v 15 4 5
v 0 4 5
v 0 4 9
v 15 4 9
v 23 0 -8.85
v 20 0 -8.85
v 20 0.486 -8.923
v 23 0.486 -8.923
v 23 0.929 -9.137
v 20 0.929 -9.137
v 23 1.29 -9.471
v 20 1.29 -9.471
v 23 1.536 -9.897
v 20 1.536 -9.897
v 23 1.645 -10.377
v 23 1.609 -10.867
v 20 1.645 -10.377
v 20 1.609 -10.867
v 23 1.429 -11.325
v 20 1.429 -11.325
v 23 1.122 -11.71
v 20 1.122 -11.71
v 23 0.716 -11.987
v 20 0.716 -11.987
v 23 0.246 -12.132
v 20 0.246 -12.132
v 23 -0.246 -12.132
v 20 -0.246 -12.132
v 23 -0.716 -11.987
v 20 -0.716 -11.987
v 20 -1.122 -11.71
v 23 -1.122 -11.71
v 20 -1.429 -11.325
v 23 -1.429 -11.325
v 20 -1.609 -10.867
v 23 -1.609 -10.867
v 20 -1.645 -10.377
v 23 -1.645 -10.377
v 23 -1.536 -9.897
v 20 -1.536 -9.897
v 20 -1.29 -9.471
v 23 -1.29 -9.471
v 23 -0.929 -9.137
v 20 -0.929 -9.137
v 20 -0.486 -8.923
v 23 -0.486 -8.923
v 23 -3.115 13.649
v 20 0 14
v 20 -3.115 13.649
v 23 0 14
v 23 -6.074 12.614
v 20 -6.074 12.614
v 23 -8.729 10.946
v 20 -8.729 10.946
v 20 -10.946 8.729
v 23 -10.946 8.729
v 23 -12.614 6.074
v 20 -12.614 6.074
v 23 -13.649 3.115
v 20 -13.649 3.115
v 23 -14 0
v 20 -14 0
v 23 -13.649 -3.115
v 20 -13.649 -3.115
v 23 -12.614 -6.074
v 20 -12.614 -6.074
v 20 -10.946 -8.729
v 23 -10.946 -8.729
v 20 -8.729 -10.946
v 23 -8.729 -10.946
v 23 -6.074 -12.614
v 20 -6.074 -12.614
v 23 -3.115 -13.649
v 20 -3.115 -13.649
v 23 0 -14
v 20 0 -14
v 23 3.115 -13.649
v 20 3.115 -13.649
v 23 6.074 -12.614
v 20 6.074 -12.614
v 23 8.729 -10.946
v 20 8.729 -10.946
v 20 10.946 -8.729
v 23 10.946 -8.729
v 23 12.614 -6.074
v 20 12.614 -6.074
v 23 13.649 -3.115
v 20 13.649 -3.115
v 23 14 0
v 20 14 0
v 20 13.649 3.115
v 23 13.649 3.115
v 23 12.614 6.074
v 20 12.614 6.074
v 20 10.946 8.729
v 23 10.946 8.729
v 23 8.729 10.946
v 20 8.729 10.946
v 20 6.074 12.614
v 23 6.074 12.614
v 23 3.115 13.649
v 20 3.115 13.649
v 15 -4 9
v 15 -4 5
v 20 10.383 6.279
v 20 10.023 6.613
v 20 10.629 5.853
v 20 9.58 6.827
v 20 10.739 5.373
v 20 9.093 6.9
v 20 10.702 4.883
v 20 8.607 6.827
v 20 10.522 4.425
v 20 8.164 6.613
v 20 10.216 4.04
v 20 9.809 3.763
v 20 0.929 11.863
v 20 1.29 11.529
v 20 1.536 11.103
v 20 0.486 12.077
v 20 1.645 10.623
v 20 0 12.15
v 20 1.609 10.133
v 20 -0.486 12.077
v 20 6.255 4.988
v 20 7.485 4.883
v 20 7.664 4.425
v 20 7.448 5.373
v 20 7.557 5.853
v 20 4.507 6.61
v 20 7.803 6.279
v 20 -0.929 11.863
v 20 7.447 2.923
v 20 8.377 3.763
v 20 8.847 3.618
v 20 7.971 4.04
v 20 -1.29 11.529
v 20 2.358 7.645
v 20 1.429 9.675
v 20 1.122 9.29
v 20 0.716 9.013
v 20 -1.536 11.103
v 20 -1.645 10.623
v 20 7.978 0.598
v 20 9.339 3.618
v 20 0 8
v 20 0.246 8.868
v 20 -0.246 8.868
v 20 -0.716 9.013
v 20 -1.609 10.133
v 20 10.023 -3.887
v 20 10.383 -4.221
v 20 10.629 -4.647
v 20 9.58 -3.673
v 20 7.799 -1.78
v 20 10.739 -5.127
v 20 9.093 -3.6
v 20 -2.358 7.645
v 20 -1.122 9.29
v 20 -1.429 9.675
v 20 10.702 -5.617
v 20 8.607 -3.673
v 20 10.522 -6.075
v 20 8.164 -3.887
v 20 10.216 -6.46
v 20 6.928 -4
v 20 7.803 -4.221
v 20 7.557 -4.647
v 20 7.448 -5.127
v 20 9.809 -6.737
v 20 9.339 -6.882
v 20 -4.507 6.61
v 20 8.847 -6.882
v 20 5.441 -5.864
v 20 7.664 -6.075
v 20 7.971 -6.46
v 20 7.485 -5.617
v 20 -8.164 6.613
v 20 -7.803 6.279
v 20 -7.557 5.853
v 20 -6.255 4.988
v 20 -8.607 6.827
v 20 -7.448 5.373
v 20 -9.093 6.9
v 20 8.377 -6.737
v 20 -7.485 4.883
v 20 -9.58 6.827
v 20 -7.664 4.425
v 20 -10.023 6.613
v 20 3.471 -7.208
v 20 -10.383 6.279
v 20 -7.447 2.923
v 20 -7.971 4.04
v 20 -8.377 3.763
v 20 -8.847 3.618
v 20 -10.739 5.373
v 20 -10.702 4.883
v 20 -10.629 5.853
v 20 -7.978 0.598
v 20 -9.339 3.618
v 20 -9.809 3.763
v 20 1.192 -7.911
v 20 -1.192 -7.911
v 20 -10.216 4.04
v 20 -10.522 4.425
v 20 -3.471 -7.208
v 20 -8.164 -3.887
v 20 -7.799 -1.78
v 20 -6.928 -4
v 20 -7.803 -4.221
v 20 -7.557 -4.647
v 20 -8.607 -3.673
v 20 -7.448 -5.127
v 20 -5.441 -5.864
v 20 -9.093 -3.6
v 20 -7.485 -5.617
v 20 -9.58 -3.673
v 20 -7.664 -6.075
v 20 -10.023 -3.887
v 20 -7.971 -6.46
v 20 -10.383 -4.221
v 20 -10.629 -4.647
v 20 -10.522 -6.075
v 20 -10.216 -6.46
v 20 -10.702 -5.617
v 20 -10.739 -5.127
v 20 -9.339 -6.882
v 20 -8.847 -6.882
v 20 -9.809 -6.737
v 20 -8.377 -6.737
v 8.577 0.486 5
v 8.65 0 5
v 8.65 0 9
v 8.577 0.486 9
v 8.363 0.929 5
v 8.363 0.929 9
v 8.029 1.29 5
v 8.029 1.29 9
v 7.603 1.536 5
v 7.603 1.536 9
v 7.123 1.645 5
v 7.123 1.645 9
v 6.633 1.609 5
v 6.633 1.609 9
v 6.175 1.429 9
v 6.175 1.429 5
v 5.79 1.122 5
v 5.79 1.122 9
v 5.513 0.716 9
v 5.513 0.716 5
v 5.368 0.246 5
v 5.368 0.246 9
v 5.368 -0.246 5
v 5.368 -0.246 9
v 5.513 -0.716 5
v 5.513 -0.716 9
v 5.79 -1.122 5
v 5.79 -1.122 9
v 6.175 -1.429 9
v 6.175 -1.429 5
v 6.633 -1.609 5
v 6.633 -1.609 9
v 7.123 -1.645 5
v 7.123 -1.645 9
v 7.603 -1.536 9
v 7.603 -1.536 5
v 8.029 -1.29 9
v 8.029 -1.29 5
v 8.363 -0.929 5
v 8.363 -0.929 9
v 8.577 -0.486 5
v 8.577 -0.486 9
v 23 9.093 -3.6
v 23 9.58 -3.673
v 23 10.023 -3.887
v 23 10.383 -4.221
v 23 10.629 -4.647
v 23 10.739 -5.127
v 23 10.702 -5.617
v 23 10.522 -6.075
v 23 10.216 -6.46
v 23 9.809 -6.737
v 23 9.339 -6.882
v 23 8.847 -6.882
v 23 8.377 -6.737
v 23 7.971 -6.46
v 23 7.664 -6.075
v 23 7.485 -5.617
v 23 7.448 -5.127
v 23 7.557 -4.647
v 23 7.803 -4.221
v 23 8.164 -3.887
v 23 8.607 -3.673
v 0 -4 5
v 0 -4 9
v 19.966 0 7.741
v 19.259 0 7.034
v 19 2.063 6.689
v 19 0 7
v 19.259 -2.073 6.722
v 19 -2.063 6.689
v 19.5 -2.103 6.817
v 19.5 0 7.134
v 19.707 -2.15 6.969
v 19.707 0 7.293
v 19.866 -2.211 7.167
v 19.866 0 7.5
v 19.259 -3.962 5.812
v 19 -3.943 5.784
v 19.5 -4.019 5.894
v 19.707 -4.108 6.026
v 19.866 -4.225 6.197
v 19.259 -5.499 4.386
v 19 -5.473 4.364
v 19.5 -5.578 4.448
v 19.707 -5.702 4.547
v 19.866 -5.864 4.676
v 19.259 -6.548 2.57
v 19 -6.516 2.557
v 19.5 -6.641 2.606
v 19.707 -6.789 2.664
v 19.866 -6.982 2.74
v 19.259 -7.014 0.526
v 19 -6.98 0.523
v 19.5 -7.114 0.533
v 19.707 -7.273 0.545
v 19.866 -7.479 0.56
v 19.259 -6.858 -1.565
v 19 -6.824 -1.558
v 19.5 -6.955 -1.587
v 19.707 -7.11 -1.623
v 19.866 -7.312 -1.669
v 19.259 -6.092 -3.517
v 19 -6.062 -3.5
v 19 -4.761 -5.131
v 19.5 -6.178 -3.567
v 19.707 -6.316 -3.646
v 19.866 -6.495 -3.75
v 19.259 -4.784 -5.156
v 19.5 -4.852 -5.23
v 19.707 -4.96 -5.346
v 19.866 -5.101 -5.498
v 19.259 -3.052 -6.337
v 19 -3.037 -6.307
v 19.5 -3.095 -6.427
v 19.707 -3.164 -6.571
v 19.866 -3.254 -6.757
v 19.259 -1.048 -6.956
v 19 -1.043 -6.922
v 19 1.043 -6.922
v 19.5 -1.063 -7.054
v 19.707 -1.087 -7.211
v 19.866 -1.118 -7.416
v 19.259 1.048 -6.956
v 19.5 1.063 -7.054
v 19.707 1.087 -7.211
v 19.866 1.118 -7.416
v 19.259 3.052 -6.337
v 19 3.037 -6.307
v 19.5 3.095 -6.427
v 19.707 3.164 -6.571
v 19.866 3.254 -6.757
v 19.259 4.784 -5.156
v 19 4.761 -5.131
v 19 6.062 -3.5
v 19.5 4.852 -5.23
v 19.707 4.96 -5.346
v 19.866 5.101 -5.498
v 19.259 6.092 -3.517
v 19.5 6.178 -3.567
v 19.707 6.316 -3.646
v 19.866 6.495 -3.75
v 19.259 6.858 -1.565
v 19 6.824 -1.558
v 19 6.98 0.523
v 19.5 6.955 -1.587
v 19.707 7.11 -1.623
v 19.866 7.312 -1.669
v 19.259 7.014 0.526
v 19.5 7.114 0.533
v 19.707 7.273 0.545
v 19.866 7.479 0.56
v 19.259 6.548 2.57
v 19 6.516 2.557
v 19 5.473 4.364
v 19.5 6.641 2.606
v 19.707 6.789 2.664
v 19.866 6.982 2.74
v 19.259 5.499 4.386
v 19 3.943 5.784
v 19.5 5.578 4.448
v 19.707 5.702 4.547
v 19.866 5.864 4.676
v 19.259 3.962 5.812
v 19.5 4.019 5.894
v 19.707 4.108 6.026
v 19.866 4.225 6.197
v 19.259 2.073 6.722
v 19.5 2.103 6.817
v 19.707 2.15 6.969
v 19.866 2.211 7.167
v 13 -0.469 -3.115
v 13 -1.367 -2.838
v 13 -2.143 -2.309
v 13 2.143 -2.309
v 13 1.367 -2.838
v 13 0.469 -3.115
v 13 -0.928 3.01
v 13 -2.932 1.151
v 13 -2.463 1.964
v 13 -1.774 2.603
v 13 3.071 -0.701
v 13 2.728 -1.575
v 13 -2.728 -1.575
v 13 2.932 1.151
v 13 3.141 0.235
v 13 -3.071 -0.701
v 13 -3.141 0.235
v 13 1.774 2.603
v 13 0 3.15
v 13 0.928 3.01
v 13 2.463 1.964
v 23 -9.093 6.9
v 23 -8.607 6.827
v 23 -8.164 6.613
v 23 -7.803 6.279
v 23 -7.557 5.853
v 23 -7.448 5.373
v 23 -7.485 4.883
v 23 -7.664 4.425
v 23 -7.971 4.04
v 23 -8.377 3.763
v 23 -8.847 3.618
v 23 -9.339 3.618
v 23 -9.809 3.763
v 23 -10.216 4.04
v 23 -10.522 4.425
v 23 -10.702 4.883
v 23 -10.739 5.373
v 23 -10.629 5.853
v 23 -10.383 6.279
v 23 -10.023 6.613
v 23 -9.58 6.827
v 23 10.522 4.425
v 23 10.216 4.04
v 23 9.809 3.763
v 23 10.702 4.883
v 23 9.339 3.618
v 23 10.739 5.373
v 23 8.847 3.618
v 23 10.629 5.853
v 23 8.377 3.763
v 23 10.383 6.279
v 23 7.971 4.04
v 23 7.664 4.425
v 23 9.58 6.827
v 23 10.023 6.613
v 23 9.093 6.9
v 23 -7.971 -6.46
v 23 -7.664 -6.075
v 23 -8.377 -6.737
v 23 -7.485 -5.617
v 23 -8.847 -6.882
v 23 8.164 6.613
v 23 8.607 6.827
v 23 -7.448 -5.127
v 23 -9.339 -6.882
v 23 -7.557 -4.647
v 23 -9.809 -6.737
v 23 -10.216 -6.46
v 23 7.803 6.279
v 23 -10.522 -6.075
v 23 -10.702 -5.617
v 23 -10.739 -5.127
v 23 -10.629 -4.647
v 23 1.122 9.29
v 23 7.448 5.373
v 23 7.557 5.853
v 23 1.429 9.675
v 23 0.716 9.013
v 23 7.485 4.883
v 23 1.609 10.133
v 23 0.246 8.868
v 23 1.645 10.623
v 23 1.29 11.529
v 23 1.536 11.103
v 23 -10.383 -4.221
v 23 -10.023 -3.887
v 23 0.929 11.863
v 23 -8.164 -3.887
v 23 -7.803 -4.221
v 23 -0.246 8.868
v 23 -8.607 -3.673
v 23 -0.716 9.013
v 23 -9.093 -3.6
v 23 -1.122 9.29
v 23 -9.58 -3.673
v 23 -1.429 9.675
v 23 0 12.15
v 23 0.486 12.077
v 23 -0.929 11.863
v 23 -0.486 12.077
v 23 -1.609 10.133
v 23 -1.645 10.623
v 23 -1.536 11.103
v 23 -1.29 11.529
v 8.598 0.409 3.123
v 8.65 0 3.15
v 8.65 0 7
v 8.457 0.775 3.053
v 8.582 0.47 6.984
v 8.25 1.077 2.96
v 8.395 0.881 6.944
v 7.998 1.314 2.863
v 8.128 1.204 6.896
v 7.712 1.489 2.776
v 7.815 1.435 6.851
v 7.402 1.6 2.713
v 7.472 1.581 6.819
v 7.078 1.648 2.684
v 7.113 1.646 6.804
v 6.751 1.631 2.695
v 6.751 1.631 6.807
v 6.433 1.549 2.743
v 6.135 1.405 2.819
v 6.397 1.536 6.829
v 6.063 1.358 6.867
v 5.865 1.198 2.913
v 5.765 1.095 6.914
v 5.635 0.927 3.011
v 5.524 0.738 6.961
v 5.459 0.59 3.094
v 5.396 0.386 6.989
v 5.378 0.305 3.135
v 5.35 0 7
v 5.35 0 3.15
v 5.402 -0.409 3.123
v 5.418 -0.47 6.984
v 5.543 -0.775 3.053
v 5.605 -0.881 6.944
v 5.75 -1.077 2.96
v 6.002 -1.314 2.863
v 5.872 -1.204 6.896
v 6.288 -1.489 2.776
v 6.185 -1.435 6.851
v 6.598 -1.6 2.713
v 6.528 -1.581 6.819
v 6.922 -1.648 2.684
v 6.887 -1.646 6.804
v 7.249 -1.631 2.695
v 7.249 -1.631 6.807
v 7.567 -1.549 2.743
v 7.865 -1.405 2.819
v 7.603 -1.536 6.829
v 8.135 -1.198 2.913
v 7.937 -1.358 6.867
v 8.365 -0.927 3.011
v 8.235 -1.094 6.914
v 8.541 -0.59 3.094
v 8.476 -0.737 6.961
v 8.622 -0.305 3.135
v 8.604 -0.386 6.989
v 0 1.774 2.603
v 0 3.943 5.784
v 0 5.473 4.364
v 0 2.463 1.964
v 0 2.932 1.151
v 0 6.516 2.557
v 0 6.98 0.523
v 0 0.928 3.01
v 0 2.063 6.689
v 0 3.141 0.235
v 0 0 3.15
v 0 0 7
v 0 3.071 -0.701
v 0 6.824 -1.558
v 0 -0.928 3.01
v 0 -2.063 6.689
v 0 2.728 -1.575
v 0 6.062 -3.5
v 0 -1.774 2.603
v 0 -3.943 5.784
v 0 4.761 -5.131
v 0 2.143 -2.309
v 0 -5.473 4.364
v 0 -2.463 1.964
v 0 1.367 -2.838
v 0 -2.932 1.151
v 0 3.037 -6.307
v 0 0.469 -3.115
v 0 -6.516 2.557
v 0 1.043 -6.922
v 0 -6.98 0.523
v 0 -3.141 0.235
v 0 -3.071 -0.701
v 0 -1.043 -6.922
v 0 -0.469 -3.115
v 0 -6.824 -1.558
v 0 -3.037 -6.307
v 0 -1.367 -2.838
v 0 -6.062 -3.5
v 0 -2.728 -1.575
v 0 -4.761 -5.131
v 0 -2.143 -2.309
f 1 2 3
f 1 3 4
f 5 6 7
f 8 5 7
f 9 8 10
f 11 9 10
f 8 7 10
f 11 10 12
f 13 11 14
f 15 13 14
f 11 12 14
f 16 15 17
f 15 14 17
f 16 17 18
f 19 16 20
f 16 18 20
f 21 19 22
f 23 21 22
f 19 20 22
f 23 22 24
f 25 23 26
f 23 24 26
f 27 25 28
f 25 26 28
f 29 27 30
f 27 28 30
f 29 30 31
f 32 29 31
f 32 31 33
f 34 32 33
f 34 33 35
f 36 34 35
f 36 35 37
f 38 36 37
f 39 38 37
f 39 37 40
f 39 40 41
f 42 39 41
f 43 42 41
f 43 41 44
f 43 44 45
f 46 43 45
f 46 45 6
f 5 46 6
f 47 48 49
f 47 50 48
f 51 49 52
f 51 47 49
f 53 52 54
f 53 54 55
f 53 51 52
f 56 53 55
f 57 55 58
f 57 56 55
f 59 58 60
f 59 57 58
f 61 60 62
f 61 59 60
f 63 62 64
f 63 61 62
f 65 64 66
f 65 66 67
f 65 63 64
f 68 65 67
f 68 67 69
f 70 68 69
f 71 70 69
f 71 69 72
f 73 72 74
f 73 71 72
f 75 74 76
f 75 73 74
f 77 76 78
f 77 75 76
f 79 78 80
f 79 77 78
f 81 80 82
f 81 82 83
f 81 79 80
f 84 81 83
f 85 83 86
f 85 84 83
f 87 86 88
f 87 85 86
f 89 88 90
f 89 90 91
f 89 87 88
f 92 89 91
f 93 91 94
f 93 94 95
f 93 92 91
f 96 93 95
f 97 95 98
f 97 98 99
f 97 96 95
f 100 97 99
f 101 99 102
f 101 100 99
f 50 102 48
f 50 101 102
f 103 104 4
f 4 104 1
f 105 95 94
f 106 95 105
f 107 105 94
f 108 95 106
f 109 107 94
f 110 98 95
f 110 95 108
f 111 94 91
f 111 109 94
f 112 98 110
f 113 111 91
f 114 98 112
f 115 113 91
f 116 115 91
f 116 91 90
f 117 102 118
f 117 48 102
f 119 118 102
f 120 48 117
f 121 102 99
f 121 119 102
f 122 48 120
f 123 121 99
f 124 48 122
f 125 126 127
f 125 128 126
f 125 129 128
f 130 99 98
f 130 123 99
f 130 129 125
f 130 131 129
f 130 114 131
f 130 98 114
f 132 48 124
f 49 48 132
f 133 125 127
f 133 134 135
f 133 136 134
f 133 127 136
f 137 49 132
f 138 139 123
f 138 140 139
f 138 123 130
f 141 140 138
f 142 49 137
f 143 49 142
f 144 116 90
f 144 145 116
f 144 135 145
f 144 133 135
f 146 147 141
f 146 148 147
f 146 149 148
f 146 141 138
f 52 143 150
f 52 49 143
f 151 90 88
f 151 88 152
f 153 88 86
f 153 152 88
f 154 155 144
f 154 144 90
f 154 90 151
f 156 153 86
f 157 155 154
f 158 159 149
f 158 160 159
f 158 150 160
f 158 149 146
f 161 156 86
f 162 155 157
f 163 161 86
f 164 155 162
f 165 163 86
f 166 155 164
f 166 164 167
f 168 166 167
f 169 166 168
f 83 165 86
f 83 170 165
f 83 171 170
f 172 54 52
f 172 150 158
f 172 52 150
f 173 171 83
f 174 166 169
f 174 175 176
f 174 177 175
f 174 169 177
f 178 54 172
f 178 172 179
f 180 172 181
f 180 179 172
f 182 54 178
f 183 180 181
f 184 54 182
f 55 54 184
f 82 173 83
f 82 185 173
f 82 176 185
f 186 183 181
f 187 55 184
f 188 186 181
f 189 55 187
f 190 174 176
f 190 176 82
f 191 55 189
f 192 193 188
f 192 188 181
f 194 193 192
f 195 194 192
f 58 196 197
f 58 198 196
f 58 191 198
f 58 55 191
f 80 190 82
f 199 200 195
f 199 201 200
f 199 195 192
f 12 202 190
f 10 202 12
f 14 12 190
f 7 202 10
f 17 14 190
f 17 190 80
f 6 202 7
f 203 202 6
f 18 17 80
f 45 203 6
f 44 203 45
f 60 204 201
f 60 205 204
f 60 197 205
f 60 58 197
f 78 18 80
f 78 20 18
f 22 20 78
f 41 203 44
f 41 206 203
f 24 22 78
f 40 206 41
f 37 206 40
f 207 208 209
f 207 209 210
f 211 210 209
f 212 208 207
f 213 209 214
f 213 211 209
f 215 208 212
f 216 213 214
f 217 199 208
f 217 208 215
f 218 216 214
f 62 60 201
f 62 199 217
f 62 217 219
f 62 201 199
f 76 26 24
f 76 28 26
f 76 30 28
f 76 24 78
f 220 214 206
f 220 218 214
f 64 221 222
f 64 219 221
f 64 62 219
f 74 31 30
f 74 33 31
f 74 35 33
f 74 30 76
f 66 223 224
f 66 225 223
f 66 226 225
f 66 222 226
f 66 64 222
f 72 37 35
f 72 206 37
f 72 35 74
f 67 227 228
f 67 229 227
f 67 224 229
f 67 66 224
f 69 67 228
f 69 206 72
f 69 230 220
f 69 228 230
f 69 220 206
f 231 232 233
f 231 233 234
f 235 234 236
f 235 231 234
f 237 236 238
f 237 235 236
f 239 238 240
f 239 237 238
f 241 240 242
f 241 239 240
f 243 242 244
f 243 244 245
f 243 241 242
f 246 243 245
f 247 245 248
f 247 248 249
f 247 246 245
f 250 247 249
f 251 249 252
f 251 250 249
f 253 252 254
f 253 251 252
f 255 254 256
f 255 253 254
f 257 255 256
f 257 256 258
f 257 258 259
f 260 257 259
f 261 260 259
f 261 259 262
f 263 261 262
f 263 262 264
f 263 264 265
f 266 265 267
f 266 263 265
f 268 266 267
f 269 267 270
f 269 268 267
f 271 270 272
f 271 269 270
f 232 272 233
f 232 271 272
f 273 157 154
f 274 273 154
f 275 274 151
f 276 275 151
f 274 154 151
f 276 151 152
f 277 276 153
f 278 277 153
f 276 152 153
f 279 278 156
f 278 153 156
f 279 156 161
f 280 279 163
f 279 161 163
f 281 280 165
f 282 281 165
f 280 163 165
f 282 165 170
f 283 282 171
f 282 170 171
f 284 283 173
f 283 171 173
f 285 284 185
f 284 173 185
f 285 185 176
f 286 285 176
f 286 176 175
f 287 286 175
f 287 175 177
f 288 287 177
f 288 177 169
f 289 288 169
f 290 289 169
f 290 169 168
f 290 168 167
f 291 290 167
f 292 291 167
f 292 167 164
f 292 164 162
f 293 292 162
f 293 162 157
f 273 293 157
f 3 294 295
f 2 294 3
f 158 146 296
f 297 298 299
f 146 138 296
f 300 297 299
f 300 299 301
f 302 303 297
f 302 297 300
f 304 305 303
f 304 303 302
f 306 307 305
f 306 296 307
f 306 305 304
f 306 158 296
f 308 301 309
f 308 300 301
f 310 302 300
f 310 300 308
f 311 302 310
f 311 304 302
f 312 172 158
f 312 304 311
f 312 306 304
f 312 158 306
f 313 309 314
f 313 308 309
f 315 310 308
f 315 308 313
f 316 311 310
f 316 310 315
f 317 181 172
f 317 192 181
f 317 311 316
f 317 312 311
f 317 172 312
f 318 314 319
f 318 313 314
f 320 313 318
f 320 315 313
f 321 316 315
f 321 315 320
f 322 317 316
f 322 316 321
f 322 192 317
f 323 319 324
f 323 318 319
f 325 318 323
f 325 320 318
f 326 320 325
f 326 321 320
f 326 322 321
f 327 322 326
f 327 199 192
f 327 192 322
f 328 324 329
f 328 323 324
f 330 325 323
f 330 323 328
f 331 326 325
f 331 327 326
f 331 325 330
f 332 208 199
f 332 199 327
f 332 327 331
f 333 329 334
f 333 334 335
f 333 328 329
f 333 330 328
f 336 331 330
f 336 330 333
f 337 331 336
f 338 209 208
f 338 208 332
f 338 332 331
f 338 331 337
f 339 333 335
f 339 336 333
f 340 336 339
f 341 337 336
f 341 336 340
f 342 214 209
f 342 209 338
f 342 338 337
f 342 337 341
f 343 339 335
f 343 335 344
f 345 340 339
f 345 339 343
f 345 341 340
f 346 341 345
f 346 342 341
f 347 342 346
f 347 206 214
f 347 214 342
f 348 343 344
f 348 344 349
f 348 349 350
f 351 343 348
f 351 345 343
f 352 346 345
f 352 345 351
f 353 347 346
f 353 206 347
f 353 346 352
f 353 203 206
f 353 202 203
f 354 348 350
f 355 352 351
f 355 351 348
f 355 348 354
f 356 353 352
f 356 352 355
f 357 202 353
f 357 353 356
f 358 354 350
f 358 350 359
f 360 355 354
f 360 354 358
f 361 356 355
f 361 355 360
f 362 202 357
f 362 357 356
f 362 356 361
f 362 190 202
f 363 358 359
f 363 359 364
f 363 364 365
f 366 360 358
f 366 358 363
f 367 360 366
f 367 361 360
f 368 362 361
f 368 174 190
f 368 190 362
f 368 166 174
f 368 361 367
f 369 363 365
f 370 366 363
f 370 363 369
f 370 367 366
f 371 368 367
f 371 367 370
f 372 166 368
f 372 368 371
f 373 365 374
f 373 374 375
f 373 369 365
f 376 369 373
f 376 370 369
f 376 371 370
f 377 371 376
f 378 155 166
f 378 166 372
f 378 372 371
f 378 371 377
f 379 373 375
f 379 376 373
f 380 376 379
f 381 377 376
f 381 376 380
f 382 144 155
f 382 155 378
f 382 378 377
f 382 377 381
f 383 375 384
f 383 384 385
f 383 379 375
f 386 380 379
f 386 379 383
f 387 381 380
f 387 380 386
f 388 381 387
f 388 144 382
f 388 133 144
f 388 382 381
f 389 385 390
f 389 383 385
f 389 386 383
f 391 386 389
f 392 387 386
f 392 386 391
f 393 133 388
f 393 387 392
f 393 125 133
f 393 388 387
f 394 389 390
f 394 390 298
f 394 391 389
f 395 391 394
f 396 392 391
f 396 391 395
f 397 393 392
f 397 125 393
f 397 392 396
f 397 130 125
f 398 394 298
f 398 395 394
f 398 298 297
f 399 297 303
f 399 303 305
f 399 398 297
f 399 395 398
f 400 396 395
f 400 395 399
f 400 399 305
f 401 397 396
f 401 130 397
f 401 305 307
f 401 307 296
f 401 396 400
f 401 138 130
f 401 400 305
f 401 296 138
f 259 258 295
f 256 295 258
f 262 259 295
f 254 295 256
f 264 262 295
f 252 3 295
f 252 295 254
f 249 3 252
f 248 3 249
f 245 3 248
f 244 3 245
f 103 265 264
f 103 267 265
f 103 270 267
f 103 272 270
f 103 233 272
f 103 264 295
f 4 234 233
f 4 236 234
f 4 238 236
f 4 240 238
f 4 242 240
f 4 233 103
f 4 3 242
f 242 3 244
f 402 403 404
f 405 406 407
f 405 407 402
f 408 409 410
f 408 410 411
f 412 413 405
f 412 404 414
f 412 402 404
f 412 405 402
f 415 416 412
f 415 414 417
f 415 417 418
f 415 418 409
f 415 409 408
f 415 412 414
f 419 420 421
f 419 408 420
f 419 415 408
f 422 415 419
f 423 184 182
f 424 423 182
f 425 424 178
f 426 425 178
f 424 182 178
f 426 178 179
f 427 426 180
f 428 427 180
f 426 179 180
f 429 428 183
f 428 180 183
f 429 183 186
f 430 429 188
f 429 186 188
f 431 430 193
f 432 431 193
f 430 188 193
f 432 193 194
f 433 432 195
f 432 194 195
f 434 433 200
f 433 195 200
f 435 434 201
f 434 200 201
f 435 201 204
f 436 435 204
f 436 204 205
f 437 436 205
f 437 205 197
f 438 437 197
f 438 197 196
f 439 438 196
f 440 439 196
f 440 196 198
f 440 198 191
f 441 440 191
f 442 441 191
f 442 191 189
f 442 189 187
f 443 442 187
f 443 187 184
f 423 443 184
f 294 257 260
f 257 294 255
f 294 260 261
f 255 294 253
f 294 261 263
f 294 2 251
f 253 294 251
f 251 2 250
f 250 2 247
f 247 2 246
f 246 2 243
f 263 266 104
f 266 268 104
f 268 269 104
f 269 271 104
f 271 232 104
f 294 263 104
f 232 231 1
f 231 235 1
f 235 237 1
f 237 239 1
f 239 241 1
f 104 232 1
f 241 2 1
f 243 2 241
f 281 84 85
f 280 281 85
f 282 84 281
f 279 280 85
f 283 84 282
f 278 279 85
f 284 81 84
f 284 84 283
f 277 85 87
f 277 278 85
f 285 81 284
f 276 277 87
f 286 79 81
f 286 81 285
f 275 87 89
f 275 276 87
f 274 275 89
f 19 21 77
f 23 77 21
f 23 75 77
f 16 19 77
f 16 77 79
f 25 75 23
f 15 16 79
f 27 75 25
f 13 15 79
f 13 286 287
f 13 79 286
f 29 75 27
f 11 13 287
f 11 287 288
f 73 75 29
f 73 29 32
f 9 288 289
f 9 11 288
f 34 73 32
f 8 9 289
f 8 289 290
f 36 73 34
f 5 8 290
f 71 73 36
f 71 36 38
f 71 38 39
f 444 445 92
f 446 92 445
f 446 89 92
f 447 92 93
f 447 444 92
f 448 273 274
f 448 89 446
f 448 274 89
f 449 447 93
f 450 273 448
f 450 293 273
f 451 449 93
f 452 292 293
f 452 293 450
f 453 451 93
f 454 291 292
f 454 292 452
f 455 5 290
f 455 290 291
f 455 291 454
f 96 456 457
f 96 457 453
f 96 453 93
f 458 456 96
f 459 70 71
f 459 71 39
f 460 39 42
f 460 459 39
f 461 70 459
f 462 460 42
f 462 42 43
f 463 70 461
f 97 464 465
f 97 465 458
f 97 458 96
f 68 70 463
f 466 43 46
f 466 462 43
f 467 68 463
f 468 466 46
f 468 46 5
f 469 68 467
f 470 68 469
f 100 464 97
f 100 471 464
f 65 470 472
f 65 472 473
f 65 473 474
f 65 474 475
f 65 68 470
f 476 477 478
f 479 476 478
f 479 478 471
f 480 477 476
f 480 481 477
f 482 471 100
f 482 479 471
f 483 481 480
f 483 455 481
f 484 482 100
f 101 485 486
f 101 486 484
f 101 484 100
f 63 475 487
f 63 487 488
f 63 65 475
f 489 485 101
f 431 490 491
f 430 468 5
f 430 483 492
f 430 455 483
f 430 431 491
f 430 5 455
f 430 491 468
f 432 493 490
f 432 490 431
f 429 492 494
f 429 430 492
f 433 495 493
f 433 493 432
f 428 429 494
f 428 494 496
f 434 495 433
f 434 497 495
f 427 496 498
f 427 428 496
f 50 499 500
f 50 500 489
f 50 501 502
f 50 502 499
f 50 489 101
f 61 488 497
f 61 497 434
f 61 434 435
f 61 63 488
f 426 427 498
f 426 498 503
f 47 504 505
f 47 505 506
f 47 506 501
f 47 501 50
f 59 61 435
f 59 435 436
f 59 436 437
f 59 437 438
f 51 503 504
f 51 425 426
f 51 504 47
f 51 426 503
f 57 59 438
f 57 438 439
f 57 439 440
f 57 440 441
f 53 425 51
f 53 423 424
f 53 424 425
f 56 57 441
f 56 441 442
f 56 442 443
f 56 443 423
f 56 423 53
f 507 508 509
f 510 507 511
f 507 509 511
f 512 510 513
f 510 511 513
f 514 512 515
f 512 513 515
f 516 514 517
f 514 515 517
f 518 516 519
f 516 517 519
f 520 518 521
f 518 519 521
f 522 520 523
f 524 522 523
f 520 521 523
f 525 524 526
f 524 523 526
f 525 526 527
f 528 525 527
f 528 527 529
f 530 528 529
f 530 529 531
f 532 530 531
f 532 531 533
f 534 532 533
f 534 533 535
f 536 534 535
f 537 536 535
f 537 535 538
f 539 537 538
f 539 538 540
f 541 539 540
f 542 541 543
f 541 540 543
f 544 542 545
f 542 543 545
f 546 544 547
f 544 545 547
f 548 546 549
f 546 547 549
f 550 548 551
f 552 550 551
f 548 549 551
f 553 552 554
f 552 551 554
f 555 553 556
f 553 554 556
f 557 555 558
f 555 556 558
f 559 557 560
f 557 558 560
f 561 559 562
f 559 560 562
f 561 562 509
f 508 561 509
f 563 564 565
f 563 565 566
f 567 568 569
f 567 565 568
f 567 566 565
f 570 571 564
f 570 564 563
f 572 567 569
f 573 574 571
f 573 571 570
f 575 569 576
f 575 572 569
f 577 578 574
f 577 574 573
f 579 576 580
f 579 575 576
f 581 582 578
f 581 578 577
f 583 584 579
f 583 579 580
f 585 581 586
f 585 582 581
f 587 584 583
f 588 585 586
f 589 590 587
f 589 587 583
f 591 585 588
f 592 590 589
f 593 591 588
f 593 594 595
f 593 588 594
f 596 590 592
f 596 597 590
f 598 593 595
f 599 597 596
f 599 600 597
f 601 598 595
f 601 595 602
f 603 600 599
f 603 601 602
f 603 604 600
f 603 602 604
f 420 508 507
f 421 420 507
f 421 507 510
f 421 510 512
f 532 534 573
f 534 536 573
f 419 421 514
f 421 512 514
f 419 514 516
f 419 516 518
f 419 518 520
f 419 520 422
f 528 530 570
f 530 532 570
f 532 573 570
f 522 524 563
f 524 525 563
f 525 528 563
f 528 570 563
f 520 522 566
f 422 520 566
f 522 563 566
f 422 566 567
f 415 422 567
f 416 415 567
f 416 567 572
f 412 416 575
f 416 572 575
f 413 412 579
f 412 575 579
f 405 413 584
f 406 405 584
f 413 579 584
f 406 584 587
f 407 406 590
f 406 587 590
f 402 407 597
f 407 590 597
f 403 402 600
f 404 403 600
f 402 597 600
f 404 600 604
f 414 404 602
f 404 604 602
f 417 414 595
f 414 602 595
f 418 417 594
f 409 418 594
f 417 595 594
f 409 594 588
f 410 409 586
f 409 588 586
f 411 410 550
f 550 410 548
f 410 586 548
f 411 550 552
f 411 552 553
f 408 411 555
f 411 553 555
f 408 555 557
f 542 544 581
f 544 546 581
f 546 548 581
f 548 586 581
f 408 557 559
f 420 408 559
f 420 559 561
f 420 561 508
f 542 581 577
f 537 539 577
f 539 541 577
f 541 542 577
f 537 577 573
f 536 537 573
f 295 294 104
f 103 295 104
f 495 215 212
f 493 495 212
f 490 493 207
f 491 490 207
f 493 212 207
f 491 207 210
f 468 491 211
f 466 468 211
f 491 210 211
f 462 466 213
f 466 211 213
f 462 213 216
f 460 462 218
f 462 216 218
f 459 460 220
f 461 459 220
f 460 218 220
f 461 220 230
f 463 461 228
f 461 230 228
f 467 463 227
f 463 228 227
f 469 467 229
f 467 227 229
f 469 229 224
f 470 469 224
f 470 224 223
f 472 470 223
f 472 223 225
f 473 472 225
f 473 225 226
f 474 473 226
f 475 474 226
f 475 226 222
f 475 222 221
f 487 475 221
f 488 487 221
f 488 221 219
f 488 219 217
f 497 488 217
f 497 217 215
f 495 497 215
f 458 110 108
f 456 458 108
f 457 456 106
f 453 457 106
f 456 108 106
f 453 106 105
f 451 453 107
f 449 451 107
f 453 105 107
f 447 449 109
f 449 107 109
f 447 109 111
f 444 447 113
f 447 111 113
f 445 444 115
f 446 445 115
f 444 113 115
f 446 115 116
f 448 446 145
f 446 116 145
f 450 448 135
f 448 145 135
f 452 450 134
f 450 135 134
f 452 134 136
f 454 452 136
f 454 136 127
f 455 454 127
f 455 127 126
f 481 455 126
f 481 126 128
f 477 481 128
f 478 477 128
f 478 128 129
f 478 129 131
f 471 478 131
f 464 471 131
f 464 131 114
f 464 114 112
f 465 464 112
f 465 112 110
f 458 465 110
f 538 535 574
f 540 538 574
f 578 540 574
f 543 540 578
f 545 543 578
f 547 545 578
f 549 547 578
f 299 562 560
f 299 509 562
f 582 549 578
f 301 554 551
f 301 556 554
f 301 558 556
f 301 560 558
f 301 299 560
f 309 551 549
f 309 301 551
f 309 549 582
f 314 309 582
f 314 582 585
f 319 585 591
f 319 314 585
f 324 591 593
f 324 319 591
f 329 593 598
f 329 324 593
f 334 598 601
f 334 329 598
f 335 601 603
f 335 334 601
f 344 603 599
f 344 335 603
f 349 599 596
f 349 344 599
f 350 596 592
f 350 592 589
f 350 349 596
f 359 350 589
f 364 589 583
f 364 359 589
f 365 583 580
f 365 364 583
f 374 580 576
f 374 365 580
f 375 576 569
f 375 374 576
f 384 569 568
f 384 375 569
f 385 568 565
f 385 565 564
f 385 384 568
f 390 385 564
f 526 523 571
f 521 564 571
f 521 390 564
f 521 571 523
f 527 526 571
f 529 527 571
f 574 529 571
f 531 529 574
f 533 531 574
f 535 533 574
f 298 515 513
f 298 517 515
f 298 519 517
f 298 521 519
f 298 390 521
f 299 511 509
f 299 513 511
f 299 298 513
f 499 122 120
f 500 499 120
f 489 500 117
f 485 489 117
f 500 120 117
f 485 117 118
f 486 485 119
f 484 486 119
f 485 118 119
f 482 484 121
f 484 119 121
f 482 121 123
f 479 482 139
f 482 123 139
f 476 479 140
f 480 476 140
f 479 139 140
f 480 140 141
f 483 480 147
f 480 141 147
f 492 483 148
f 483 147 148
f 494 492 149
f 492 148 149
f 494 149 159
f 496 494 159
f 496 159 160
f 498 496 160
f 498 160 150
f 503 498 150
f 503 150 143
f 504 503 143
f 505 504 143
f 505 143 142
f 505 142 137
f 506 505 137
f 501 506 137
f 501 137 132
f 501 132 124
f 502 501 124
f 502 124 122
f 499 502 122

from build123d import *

# Parameters (mm, degrees)
CUT_EXTRUDE1_REACH       = 30.142
SKETCH2_R                = 1.65
SKETCH4_R                = 3.15
CUT_EXTRUDE2_DEPTH       = 13
SKETCH5_R                = 1.65
CUT_EXTRUDE4_DEPTH       = 6
FILLET1_R                = 1
BOSS_EXTRUDE1_DEPTH      = 2
BOSS_EXTRUDE1_DEPTH_BACK = 2
SKETCH6_W                = 15
SKETCH6_H                = 8
SKETCH6_R                = 1.65


with BuildPart() as part:
    # Sketch1 → Revolve1 (revolve)
    with BuildSketch(Plane(origin=(0, 0, 0), x_dir=(1, 0, 0), z_dir=(0, 1, 0))):
        Polygon((0, 0), (0, 7), (20, 7), (20, 14), (23, 14), (23, 0), align=None)
    revolve(axis=Axis((0, 0, 0), (1, 0, 0)))

    # Sketch2 → Cut-Extrude1 (cut, up to next)
    with BuildSketch(Plane.ZY.offset(-20), mode=Mode.PRIVATE) as cut_extrude1_sk1:
        with Locations((10.5, 0)):
            Circle(SKETCH2_R)
    cut_extrude1_tool1 = extrude(cut_extrude1_sk1.sketch, amount=-CUT_EXTRUDE1_REACH, mode=Mode.PRIVATE) & part.part
    # Sketch2 → Cut-Extrude1 (cut, up to next)
    with BuildSketch(Plane.ZY.offset(-20), mode=Mode.PRIVATE) as cut_extrude1_sk2:
        with Locations((5.25, -9.09326674)):
            Circle(SKETCH2_R)
    cut_extrude1_tool2 = extrude(cut_extrude1_sk2.sketch, amount=-CUT_EXTRUDE1_REACH, mode=Mode.PRIVATE) & part.part
    # Sketch2 → Cut-Extrude1 (cut, up to next)
    with BuildSketch(Plane.ZY.offset(-20), mode=Mode.PRIVATE) as cut_extrude1_sk3:
        with Locations((-5.25, -9.09326674)):
            Circle(SKETCH2_R)
    cut_extrude1_tool3 = extrude(cut_extrude1_sk3.sketch, amount=-CUT_EXTRUDE1_REACH, mode=Mode.PRIVATE) & part.part
    # Sketch2 → Cut-Extrude1 (cut, up to next)
    with BuildSketch(Plane.ZY.offset(-20), mode=Mode.PRIVATE) as cut_extrude1_sk4:
        with Locations((-10.5, 0)):
            Circle(SKETCH2_R)
    cut_extrude1_tool4 = extrude(cut_extrude1_sk4.sketch, amount=-CUT_EXTRUDE1_REACH, mode=Mode.PRIVATE) & part.part
    # Sketch2 → Cut-Extrude1 (cut, up to next)
    with BuildSketch(Plane.ZY.offset(-20), mode=Mode.PRIVATE) as cut_extrude1_sk5:
        with Locations((-5.25, 9.09326674)):
            Circle(SKETCH2_R)
    cut_extrude1_tool5 = extrude(cut_extrude1_sk5.sketch, amount=-CUT_EXTRUDE1_REACH, mode=Mode.PRIVATE) & part.part
    # Sketch2 → Cut-Extrude1 (cut, up to next)
    with BuildSketch(Plane.ZY.offset(-20), mode=Mode.PRIVATE) as cut_extrude1_sk6:
        with Locations((5.25, 9.09326674)):
            Circle(SKETCH2_R)
    cut_extrude1_tool6 = extrude(cut_extrude1_sk6.sketch, amount=-CUT_EXTRUDE1_REACH, mode=Mode.PRIVATE) & part.part
    add(cut_extrude1_tool1.solids().sort_by_distance((20, 0, 10.5))[0], mode=Mode.SUBTRACT)
    add(cut_extrude1_tool2.solids().sort_by_distance((20, -9.093267, 5.25))[0], mode=Mode.SUBTRACT)
    add(cut_extrude1_tool3.solids().sort_by_distance((20, -9.093267, -5.25))[0], mode=Mode.SUBTRACT)
    add(cut_extrude1_tool4.solids().sort_by_distance((20, 0, -10.5))[0], mode=Mode.SUBTRACT)
    add(cut_extrude1_tool5.solids().sort_by_distance((20, 9.093267, -5.25))[0], mode=Mode.SUBTRACT)
    add(cut_extrude1_tool6.solids().sort_by_distance((20, 9.093267, 5.25))[0], mode=Mode.SUBTRACT)

    # Sketch4 → Cut-Extrude2 (cut)
    with BuildSketch(Plane.ZY):
        Circle(SKETCH4_R)
    extrude(amount=-CUT_EXTRUDE2_DEPTH, mode=Mode.SUBTRACT)

    # Sketch5 → Cut-Extrude4 (cut)
    with BuildSketch(Plane.XY.offset(7)):
        with Locations((7, 0)):
            Circle(SKETCH5_R)
    extrude(amount=-CUT_EXTRUDE4_DEPTH, mode=Mode.SUBTRACT)

    # Fillet1
    fillet1_edges = [part.edges().sort_by_distance(p)[0] for p in [
        (20, 0, 7),
    ]]
    fillet(fillet1_edges, radius=FILLET1_R)


with BuildPart() as body_2:
    # Sketch6 → Boss-Extrude1 (new, two sides: drawn at the far end of the back side and taken through both)
    with BuildSketch(Plane.XY.offset(7).offset(-BOSS_EXTRUDE1_DEPTH_BACK)):
        with Locations((7.5, 0)):
            Rectangle(SKETCH6_W, SKETCH6_H)
        with Locations((7, 0)):
            Circle(SKETCH6_R, mode=Mode.SUBTRACT)
    extrude(amount=BOSS_EXTRUDE1_DEPTH + BOSS_EXTRUDE1_DEPTH_BACK)


solid = Compound([part.part, body_2.part])
